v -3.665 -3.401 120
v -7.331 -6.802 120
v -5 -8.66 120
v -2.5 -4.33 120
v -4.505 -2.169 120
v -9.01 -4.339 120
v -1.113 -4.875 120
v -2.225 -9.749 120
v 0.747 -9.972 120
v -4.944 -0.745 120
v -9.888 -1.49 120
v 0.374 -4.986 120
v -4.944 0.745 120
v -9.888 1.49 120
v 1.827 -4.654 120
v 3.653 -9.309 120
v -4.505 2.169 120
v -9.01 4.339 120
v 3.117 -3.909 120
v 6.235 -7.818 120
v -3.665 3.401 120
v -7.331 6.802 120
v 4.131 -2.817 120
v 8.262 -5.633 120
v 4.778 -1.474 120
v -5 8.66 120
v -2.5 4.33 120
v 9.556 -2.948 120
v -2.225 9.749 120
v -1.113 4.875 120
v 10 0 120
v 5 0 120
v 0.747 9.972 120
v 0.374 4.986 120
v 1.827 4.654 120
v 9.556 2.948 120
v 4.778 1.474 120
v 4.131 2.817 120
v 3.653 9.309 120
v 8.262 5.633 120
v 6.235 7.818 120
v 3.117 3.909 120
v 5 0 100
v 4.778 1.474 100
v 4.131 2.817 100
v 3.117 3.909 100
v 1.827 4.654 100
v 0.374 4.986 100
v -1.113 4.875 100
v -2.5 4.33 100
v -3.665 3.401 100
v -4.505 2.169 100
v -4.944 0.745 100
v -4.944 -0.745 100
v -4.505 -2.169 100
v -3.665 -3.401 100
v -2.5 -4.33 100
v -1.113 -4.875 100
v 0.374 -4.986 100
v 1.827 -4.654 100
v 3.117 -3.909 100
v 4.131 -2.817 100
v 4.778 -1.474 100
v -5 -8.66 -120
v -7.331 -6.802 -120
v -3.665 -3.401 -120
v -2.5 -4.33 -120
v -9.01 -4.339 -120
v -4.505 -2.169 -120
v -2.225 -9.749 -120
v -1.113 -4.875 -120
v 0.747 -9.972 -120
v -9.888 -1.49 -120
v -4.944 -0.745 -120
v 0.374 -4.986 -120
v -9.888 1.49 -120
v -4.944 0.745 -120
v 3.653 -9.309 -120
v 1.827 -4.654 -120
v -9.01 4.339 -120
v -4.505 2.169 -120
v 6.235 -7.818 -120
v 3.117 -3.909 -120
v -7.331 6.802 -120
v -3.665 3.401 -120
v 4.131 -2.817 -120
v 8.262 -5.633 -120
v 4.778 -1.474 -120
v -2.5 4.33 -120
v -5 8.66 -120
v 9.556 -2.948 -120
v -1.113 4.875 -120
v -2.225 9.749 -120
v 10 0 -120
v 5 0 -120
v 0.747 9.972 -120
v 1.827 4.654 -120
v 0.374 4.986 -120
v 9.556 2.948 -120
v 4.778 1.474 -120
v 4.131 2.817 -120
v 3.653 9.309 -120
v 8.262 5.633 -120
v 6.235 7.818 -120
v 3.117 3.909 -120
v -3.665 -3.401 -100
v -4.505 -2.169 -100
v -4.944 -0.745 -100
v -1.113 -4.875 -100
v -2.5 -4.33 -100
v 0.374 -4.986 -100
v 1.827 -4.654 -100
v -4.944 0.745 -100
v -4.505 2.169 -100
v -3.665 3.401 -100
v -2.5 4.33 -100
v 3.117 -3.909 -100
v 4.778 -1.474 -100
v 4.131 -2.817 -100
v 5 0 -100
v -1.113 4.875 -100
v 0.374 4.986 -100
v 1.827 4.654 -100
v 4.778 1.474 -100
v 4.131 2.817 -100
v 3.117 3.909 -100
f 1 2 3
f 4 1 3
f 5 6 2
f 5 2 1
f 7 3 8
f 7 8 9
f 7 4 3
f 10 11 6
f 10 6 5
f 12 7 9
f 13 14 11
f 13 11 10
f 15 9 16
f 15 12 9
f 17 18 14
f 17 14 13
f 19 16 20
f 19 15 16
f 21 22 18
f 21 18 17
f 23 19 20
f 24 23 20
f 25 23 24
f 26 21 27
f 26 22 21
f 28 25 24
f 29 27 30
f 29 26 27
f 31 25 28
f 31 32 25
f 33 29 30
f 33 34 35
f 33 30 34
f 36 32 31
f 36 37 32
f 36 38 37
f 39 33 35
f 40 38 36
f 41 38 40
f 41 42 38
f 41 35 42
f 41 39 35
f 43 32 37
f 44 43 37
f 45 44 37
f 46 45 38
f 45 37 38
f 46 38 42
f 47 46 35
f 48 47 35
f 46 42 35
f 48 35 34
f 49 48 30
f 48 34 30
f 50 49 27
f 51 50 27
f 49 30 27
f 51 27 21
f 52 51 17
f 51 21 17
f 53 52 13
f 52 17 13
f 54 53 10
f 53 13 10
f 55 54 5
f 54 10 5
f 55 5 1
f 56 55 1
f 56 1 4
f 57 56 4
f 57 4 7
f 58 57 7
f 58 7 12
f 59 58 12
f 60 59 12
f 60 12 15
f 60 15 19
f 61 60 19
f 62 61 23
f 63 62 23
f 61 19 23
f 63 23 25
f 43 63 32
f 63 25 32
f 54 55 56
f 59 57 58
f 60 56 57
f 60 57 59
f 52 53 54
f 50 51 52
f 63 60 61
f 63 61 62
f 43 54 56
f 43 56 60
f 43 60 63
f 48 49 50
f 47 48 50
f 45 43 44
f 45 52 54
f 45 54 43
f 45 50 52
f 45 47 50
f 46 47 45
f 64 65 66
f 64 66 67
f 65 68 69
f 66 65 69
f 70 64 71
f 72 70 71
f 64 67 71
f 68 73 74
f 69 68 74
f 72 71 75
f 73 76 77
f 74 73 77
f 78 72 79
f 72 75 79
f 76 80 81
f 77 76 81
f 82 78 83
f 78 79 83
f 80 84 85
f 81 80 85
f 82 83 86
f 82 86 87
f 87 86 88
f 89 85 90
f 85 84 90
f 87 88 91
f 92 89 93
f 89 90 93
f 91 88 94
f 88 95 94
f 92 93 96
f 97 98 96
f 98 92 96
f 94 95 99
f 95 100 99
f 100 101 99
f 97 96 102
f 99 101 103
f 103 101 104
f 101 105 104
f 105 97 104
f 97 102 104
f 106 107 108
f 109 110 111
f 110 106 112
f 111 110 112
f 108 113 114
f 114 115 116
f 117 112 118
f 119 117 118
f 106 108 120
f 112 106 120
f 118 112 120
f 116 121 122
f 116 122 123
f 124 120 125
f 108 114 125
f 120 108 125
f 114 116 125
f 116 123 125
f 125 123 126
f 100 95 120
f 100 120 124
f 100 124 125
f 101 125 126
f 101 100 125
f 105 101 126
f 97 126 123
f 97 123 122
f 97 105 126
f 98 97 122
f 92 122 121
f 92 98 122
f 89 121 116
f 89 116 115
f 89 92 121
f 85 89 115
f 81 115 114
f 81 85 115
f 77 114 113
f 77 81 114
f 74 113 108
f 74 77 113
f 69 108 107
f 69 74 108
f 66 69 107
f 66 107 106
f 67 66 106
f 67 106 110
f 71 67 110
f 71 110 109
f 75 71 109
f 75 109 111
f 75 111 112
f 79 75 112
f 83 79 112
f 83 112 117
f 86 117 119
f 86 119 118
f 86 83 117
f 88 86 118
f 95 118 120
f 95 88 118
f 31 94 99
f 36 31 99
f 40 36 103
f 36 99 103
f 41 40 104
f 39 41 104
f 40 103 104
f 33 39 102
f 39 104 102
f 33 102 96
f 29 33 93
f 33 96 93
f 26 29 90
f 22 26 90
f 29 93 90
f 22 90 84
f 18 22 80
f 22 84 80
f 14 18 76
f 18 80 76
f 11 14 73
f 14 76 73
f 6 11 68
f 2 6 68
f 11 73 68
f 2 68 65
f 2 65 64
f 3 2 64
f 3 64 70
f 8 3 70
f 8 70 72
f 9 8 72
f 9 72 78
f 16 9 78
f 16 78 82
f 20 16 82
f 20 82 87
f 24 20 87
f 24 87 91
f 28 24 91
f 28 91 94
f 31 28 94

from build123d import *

# Parameters (mm, degrees)
SKETCH1_R           = 10
BOSS_EXTRUDE1_DEPTH = 100
BOSS_EXTRUDE2_START = 20
SKETCH3_R           = 10
SKETCH3_R_2         = 5
BOSS_EXTRUDE2_DEPTH = 20


with BuildPart() as part:
    # Sketch1 → Boss-Extrude1 (new, symmetric)
    with BuildSketch(Plane.XY):
        Circle(SKETCH1_R)
    extrude(amount=BOSS_EXTRUDE1_DEPTH, both=True)

    # Sketch3 → Boss-Extrude2 (add)
    with BuildSketch(Plane.XY.offset(100).offset(BOSS_EXTRUDE2_START)):
        Circle(SKETCH3_R)
        Circle(SKETCH3_R_2, mode=Mode.SUBTRACT)
    boss_extrude2 = extrude(amount=-BOSS_EXTRUDE2_DEPTH)

    # Mirror1: Boss-Extrude2 across plane
    add(boss_extrude2.mirror(Plane.XY))


solid = part.part
